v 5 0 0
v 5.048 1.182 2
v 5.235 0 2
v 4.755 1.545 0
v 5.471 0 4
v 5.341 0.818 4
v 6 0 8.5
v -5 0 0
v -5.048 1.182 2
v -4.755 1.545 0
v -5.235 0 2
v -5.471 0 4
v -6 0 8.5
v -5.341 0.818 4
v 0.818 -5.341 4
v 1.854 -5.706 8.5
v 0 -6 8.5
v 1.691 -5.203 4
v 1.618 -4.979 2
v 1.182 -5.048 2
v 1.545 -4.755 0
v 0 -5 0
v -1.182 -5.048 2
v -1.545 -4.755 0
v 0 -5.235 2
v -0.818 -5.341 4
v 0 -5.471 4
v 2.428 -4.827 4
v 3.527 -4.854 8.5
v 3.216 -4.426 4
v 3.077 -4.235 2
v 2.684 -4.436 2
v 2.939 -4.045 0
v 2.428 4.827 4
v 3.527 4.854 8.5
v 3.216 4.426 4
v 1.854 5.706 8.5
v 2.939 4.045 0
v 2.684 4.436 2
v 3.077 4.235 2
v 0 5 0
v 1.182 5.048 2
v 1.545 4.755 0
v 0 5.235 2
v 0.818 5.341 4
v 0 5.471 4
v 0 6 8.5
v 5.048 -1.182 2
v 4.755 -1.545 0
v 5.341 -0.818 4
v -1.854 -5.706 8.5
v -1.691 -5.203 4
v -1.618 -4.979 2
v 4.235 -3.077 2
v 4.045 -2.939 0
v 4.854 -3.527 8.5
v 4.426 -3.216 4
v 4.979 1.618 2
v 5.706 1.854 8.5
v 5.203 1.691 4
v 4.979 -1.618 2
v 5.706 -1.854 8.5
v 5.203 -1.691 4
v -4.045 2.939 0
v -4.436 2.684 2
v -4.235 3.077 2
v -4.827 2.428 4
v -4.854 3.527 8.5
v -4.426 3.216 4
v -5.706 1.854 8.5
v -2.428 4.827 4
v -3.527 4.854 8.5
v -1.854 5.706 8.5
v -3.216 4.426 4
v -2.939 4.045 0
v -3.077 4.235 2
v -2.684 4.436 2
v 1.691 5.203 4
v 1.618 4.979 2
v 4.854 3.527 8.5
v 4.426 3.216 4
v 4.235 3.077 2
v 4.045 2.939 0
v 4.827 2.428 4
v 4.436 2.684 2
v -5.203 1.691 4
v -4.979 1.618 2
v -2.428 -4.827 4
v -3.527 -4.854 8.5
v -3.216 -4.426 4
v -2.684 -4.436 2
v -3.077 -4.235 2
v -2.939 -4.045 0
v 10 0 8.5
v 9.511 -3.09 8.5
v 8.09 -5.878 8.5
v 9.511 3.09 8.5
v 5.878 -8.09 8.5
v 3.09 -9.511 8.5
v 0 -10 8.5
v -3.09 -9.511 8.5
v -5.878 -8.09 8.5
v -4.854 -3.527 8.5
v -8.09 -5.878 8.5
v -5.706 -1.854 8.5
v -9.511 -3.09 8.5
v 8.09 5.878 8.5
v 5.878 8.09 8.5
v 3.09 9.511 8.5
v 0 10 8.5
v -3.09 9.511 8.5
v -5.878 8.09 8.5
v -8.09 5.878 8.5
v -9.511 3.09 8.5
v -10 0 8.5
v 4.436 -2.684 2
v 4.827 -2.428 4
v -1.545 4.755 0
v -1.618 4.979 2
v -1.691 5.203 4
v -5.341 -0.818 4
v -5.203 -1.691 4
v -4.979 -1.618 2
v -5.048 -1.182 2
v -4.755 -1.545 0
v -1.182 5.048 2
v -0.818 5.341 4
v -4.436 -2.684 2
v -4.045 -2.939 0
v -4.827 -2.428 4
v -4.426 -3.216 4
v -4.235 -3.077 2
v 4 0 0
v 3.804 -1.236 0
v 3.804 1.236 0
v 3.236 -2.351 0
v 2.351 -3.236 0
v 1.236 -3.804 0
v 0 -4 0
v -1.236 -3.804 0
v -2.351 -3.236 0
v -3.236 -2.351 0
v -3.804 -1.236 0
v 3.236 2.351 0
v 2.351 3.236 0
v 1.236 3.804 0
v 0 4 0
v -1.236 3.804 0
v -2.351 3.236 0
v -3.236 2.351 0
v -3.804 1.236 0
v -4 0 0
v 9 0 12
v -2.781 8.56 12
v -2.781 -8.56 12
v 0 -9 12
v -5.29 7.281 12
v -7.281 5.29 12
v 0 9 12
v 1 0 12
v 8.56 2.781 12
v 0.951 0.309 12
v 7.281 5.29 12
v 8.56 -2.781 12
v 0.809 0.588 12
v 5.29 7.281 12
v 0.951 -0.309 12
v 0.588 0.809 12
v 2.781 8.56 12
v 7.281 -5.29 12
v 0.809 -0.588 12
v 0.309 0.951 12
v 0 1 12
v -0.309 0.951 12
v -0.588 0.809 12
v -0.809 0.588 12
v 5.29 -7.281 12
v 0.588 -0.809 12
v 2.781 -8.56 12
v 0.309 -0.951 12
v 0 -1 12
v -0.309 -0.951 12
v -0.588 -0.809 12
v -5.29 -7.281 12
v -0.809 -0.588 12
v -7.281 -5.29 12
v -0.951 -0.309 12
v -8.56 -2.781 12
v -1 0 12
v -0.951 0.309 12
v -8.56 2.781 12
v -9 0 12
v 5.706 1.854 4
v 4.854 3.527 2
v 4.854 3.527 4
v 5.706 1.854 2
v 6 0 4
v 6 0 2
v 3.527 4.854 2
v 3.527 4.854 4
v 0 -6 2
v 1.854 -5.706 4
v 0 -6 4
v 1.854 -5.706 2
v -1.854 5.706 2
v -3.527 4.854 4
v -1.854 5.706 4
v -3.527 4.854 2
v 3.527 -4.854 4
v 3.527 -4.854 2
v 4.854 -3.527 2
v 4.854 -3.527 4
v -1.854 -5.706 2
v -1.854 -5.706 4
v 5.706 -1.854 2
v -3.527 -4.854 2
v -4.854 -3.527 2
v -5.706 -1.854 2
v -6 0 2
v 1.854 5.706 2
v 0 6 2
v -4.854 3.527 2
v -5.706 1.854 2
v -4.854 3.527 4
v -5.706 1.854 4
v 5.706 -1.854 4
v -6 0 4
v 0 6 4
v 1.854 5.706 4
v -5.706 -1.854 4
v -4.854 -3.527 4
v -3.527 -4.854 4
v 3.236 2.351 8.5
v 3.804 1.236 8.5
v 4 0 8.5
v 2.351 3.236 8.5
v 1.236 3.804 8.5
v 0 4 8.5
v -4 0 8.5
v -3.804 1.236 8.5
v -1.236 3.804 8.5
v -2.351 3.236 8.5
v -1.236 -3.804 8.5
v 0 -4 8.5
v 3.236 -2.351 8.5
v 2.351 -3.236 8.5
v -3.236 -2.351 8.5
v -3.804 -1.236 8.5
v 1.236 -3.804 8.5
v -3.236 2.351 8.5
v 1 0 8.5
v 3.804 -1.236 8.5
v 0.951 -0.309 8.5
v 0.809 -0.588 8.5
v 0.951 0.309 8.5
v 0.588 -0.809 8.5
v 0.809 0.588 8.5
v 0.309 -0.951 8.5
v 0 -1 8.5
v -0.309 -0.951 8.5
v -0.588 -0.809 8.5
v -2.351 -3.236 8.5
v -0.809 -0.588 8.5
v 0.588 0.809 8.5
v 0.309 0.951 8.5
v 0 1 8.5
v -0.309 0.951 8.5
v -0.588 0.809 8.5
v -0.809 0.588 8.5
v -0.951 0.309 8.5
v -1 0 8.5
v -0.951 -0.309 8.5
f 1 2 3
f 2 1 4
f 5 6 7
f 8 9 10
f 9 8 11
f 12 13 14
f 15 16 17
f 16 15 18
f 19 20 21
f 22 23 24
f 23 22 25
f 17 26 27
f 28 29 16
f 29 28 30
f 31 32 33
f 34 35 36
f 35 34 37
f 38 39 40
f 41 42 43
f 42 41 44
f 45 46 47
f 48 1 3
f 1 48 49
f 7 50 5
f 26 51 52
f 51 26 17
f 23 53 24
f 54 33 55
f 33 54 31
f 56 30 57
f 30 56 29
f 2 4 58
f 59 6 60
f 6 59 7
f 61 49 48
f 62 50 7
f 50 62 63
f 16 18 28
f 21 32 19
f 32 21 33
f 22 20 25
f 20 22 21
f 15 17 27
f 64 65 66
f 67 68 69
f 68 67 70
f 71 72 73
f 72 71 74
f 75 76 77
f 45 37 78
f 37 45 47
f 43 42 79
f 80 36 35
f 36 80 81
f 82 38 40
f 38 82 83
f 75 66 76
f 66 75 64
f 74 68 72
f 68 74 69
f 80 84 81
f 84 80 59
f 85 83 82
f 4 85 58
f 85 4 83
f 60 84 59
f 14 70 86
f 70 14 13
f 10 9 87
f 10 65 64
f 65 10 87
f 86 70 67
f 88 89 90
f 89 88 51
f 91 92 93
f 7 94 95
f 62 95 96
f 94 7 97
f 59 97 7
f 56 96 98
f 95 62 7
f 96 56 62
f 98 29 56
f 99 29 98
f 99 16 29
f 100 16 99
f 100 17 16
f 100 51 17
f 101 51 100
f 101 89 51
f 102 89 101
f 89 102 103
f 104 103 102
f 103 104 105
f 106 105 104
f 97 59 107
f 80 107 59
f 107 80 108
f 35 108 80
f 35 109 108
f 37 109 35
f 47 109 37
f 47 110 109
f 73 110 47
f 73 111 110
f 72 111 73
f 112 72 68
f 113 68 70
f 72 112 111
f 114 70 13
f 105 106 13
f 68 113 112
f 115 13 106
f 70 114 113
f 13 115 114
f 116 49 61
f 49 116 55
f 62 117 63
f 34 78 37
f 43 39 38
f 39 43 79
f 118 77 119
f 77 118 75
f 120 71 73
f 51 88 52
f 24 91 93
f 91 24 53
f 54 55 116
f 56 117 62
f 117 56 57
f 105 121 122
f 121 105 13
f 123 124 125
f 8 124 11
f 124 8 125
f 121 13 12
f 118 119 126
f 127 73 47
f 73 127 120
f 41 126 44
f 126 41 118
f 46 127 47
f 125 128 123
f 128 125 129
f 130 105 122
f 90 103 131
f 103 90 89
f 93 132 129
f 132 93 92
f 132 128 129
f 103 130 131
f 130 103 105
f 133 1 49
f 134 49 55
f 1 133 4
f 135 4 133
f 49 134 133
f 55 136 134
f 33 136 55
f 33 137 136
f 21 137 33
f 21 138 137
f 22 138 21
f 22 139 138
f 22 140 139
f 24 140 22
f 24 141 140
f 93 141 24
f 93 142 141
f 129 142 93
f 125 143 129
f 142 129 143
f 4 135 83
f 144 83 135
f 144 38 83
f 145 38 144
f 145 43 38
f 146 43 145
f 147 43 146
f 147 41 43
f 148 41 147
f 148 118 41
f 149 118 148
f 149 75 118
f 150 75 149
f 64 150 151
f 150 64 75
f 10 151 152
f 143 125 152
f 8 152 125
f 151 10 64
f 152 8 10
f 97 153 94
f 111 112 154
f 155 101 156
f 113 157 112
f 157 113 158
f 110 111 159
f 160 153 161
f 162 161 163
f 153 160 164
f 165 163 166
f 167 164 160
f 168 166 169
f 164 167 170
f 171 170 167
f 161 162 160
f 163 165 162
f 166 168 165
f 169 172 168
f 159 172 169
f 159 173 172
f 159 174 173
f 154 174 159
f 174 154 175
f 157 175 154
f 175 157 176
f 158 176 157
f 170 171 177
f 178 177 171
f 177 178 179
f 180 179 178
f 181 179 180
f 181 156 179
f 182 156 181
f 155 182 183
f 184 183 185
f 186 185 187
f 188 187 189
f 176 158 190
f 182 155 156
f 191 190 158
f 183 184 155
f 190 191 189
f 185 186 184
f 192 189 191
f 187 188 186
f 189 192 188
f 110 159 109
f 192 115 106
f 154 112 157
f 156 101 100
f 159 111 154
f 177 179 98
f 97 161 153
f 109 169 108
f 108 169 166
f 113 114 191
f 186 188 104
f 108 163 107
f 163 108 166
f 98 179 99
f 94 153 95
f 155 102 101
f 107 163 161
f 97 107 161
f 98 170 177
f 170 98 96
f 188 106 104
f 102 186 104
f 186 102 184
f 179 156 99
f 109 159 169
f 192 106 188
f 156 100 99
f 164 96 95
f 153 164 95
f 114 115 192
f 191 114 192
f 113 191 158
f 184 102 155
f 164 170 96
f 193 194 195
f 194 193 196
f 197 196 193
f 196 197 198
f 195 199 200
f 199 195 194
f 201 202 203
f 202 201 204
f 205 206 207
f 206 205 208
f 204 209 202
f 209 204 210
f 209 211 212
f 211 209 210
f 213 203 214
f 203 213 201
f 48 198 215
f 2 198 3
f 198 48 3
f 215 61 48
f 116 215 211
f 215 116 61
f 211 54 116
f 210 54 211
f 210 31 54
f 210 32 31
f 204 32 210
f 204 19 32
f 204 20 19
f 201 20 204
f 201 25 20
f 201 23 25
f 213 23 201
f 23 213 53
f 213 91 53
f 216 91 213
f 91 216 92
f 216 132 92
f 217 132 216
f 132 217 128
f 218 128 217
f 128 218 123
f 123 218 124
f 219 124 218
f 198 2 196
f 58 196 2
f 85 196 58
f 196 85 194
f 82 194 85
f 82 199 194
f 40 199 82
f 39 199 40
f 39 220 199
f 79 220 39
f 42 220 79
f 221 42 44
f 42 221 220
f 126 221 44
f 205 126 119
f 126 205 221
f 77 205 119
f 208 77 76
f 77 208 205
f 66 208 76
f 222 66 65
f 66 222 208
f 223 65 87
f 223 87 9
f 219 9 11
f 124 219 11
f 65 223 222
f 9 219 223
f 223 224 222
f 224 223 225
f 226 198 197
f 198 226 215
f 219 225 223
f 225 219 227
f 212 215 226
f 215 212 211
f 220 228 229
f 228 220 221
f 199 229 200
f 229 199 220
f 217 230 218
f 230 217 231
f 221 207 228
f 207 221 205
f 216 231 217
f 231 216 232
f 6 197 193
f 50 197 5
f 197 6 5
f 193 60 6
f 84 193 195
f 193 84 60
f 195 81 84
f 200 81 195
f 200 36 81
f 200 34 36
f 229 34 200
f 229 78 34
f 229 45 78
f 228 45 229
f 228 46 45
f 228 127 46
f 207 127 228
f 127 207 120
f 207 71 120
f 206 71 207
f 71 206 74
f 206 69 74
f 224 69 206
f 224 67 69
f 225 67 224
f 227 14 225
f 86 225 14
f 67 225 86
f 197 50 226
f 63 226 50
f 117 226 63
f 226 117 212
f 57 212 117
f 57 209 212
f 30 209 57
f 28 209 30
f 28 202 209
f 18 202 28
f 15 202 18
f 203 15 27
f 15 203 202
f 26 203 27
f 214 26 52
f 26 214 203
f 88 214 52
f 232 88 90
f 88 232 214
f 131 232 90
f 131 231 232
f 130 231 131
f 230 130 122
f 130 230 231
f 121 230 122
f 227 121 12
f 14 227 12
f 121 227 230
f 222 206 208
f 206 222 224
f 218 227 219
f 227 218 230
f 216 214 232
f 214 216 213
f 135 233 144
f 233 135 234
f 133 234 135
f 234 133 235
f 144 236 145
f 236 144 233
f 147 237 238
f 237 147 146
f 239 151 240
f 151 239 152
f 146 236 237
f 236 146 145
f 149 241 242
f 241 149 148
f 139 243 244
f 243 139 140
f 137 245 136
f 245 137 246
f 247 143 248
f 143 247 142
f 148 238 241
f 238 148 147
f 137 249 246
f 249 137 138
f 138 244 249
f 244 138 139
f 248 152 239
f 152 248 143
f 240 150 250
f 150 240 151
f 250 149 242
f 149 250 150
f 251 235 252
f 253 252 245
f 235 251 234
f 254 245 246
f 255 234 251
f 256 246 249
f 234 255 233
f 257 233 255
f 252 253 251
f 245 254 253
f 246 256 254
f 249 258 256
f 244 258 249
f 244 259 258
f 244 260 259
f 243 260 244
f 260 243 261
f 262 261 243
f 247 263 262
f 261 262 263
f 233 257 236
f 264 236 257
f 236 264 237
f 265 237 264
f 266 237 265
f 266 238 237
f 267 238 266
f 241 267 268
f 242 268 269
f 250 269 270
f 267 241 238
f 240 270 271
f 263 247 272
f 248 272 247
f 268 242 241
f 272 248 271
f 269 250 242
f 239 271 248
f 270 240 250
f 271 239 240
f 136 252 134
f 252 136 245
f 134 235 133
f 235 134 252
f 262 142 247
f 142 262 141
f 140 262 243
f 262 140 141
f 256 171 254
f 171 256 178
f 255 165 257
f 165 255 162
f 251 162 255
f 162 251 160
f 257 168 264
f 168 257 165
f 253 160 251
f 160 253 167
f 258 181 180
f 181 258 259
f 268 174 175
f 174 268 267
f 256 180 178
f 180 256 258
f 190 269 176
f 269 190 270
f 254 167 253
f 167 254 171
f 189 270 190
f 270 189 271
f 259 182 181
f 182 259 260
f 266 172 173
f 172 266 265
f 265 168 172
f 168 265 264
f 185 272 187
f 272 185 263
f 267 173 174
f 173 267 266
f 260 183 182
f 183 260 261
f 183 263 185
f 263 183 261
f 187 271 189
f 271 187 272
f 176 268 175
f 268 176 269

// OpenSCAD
// openNSP_project, end caps section version 1.1
// the end caps for both drones and chanters
// Zexuan Qiao, 2025
// under GPL license ver3

capLOA = 12; //.1
chamber = 8.5; //.1
bore = 8; //.1
mainDiameter = 10; //.1
pin = 2; //.1
bell = 20; //.1
endOffset = 2; //.1
decoration = 2; //.1
decoPos = 2; //.1

decoDiameter = mainDiameter + 2;
/* [Utilities] */
// Segments, the higher the value, the smoother the surface would be.
$fn = 20;

difference(){
union(){
cylinder(h = chamber, d1 = mainDiameter, d2 = mainDiameter + endOffset);
translate([0,0,chamber]) cylinder(h = capLOA - chamber, d1 = bell, d2 = bell - endOffset);
translate([0,0,decoPos]) cylinder(h = decoration, d = decoDiameter);
}
cylinder(h = chamber, d = bore);
cylinder(h = capLOA, d = pin);
}
